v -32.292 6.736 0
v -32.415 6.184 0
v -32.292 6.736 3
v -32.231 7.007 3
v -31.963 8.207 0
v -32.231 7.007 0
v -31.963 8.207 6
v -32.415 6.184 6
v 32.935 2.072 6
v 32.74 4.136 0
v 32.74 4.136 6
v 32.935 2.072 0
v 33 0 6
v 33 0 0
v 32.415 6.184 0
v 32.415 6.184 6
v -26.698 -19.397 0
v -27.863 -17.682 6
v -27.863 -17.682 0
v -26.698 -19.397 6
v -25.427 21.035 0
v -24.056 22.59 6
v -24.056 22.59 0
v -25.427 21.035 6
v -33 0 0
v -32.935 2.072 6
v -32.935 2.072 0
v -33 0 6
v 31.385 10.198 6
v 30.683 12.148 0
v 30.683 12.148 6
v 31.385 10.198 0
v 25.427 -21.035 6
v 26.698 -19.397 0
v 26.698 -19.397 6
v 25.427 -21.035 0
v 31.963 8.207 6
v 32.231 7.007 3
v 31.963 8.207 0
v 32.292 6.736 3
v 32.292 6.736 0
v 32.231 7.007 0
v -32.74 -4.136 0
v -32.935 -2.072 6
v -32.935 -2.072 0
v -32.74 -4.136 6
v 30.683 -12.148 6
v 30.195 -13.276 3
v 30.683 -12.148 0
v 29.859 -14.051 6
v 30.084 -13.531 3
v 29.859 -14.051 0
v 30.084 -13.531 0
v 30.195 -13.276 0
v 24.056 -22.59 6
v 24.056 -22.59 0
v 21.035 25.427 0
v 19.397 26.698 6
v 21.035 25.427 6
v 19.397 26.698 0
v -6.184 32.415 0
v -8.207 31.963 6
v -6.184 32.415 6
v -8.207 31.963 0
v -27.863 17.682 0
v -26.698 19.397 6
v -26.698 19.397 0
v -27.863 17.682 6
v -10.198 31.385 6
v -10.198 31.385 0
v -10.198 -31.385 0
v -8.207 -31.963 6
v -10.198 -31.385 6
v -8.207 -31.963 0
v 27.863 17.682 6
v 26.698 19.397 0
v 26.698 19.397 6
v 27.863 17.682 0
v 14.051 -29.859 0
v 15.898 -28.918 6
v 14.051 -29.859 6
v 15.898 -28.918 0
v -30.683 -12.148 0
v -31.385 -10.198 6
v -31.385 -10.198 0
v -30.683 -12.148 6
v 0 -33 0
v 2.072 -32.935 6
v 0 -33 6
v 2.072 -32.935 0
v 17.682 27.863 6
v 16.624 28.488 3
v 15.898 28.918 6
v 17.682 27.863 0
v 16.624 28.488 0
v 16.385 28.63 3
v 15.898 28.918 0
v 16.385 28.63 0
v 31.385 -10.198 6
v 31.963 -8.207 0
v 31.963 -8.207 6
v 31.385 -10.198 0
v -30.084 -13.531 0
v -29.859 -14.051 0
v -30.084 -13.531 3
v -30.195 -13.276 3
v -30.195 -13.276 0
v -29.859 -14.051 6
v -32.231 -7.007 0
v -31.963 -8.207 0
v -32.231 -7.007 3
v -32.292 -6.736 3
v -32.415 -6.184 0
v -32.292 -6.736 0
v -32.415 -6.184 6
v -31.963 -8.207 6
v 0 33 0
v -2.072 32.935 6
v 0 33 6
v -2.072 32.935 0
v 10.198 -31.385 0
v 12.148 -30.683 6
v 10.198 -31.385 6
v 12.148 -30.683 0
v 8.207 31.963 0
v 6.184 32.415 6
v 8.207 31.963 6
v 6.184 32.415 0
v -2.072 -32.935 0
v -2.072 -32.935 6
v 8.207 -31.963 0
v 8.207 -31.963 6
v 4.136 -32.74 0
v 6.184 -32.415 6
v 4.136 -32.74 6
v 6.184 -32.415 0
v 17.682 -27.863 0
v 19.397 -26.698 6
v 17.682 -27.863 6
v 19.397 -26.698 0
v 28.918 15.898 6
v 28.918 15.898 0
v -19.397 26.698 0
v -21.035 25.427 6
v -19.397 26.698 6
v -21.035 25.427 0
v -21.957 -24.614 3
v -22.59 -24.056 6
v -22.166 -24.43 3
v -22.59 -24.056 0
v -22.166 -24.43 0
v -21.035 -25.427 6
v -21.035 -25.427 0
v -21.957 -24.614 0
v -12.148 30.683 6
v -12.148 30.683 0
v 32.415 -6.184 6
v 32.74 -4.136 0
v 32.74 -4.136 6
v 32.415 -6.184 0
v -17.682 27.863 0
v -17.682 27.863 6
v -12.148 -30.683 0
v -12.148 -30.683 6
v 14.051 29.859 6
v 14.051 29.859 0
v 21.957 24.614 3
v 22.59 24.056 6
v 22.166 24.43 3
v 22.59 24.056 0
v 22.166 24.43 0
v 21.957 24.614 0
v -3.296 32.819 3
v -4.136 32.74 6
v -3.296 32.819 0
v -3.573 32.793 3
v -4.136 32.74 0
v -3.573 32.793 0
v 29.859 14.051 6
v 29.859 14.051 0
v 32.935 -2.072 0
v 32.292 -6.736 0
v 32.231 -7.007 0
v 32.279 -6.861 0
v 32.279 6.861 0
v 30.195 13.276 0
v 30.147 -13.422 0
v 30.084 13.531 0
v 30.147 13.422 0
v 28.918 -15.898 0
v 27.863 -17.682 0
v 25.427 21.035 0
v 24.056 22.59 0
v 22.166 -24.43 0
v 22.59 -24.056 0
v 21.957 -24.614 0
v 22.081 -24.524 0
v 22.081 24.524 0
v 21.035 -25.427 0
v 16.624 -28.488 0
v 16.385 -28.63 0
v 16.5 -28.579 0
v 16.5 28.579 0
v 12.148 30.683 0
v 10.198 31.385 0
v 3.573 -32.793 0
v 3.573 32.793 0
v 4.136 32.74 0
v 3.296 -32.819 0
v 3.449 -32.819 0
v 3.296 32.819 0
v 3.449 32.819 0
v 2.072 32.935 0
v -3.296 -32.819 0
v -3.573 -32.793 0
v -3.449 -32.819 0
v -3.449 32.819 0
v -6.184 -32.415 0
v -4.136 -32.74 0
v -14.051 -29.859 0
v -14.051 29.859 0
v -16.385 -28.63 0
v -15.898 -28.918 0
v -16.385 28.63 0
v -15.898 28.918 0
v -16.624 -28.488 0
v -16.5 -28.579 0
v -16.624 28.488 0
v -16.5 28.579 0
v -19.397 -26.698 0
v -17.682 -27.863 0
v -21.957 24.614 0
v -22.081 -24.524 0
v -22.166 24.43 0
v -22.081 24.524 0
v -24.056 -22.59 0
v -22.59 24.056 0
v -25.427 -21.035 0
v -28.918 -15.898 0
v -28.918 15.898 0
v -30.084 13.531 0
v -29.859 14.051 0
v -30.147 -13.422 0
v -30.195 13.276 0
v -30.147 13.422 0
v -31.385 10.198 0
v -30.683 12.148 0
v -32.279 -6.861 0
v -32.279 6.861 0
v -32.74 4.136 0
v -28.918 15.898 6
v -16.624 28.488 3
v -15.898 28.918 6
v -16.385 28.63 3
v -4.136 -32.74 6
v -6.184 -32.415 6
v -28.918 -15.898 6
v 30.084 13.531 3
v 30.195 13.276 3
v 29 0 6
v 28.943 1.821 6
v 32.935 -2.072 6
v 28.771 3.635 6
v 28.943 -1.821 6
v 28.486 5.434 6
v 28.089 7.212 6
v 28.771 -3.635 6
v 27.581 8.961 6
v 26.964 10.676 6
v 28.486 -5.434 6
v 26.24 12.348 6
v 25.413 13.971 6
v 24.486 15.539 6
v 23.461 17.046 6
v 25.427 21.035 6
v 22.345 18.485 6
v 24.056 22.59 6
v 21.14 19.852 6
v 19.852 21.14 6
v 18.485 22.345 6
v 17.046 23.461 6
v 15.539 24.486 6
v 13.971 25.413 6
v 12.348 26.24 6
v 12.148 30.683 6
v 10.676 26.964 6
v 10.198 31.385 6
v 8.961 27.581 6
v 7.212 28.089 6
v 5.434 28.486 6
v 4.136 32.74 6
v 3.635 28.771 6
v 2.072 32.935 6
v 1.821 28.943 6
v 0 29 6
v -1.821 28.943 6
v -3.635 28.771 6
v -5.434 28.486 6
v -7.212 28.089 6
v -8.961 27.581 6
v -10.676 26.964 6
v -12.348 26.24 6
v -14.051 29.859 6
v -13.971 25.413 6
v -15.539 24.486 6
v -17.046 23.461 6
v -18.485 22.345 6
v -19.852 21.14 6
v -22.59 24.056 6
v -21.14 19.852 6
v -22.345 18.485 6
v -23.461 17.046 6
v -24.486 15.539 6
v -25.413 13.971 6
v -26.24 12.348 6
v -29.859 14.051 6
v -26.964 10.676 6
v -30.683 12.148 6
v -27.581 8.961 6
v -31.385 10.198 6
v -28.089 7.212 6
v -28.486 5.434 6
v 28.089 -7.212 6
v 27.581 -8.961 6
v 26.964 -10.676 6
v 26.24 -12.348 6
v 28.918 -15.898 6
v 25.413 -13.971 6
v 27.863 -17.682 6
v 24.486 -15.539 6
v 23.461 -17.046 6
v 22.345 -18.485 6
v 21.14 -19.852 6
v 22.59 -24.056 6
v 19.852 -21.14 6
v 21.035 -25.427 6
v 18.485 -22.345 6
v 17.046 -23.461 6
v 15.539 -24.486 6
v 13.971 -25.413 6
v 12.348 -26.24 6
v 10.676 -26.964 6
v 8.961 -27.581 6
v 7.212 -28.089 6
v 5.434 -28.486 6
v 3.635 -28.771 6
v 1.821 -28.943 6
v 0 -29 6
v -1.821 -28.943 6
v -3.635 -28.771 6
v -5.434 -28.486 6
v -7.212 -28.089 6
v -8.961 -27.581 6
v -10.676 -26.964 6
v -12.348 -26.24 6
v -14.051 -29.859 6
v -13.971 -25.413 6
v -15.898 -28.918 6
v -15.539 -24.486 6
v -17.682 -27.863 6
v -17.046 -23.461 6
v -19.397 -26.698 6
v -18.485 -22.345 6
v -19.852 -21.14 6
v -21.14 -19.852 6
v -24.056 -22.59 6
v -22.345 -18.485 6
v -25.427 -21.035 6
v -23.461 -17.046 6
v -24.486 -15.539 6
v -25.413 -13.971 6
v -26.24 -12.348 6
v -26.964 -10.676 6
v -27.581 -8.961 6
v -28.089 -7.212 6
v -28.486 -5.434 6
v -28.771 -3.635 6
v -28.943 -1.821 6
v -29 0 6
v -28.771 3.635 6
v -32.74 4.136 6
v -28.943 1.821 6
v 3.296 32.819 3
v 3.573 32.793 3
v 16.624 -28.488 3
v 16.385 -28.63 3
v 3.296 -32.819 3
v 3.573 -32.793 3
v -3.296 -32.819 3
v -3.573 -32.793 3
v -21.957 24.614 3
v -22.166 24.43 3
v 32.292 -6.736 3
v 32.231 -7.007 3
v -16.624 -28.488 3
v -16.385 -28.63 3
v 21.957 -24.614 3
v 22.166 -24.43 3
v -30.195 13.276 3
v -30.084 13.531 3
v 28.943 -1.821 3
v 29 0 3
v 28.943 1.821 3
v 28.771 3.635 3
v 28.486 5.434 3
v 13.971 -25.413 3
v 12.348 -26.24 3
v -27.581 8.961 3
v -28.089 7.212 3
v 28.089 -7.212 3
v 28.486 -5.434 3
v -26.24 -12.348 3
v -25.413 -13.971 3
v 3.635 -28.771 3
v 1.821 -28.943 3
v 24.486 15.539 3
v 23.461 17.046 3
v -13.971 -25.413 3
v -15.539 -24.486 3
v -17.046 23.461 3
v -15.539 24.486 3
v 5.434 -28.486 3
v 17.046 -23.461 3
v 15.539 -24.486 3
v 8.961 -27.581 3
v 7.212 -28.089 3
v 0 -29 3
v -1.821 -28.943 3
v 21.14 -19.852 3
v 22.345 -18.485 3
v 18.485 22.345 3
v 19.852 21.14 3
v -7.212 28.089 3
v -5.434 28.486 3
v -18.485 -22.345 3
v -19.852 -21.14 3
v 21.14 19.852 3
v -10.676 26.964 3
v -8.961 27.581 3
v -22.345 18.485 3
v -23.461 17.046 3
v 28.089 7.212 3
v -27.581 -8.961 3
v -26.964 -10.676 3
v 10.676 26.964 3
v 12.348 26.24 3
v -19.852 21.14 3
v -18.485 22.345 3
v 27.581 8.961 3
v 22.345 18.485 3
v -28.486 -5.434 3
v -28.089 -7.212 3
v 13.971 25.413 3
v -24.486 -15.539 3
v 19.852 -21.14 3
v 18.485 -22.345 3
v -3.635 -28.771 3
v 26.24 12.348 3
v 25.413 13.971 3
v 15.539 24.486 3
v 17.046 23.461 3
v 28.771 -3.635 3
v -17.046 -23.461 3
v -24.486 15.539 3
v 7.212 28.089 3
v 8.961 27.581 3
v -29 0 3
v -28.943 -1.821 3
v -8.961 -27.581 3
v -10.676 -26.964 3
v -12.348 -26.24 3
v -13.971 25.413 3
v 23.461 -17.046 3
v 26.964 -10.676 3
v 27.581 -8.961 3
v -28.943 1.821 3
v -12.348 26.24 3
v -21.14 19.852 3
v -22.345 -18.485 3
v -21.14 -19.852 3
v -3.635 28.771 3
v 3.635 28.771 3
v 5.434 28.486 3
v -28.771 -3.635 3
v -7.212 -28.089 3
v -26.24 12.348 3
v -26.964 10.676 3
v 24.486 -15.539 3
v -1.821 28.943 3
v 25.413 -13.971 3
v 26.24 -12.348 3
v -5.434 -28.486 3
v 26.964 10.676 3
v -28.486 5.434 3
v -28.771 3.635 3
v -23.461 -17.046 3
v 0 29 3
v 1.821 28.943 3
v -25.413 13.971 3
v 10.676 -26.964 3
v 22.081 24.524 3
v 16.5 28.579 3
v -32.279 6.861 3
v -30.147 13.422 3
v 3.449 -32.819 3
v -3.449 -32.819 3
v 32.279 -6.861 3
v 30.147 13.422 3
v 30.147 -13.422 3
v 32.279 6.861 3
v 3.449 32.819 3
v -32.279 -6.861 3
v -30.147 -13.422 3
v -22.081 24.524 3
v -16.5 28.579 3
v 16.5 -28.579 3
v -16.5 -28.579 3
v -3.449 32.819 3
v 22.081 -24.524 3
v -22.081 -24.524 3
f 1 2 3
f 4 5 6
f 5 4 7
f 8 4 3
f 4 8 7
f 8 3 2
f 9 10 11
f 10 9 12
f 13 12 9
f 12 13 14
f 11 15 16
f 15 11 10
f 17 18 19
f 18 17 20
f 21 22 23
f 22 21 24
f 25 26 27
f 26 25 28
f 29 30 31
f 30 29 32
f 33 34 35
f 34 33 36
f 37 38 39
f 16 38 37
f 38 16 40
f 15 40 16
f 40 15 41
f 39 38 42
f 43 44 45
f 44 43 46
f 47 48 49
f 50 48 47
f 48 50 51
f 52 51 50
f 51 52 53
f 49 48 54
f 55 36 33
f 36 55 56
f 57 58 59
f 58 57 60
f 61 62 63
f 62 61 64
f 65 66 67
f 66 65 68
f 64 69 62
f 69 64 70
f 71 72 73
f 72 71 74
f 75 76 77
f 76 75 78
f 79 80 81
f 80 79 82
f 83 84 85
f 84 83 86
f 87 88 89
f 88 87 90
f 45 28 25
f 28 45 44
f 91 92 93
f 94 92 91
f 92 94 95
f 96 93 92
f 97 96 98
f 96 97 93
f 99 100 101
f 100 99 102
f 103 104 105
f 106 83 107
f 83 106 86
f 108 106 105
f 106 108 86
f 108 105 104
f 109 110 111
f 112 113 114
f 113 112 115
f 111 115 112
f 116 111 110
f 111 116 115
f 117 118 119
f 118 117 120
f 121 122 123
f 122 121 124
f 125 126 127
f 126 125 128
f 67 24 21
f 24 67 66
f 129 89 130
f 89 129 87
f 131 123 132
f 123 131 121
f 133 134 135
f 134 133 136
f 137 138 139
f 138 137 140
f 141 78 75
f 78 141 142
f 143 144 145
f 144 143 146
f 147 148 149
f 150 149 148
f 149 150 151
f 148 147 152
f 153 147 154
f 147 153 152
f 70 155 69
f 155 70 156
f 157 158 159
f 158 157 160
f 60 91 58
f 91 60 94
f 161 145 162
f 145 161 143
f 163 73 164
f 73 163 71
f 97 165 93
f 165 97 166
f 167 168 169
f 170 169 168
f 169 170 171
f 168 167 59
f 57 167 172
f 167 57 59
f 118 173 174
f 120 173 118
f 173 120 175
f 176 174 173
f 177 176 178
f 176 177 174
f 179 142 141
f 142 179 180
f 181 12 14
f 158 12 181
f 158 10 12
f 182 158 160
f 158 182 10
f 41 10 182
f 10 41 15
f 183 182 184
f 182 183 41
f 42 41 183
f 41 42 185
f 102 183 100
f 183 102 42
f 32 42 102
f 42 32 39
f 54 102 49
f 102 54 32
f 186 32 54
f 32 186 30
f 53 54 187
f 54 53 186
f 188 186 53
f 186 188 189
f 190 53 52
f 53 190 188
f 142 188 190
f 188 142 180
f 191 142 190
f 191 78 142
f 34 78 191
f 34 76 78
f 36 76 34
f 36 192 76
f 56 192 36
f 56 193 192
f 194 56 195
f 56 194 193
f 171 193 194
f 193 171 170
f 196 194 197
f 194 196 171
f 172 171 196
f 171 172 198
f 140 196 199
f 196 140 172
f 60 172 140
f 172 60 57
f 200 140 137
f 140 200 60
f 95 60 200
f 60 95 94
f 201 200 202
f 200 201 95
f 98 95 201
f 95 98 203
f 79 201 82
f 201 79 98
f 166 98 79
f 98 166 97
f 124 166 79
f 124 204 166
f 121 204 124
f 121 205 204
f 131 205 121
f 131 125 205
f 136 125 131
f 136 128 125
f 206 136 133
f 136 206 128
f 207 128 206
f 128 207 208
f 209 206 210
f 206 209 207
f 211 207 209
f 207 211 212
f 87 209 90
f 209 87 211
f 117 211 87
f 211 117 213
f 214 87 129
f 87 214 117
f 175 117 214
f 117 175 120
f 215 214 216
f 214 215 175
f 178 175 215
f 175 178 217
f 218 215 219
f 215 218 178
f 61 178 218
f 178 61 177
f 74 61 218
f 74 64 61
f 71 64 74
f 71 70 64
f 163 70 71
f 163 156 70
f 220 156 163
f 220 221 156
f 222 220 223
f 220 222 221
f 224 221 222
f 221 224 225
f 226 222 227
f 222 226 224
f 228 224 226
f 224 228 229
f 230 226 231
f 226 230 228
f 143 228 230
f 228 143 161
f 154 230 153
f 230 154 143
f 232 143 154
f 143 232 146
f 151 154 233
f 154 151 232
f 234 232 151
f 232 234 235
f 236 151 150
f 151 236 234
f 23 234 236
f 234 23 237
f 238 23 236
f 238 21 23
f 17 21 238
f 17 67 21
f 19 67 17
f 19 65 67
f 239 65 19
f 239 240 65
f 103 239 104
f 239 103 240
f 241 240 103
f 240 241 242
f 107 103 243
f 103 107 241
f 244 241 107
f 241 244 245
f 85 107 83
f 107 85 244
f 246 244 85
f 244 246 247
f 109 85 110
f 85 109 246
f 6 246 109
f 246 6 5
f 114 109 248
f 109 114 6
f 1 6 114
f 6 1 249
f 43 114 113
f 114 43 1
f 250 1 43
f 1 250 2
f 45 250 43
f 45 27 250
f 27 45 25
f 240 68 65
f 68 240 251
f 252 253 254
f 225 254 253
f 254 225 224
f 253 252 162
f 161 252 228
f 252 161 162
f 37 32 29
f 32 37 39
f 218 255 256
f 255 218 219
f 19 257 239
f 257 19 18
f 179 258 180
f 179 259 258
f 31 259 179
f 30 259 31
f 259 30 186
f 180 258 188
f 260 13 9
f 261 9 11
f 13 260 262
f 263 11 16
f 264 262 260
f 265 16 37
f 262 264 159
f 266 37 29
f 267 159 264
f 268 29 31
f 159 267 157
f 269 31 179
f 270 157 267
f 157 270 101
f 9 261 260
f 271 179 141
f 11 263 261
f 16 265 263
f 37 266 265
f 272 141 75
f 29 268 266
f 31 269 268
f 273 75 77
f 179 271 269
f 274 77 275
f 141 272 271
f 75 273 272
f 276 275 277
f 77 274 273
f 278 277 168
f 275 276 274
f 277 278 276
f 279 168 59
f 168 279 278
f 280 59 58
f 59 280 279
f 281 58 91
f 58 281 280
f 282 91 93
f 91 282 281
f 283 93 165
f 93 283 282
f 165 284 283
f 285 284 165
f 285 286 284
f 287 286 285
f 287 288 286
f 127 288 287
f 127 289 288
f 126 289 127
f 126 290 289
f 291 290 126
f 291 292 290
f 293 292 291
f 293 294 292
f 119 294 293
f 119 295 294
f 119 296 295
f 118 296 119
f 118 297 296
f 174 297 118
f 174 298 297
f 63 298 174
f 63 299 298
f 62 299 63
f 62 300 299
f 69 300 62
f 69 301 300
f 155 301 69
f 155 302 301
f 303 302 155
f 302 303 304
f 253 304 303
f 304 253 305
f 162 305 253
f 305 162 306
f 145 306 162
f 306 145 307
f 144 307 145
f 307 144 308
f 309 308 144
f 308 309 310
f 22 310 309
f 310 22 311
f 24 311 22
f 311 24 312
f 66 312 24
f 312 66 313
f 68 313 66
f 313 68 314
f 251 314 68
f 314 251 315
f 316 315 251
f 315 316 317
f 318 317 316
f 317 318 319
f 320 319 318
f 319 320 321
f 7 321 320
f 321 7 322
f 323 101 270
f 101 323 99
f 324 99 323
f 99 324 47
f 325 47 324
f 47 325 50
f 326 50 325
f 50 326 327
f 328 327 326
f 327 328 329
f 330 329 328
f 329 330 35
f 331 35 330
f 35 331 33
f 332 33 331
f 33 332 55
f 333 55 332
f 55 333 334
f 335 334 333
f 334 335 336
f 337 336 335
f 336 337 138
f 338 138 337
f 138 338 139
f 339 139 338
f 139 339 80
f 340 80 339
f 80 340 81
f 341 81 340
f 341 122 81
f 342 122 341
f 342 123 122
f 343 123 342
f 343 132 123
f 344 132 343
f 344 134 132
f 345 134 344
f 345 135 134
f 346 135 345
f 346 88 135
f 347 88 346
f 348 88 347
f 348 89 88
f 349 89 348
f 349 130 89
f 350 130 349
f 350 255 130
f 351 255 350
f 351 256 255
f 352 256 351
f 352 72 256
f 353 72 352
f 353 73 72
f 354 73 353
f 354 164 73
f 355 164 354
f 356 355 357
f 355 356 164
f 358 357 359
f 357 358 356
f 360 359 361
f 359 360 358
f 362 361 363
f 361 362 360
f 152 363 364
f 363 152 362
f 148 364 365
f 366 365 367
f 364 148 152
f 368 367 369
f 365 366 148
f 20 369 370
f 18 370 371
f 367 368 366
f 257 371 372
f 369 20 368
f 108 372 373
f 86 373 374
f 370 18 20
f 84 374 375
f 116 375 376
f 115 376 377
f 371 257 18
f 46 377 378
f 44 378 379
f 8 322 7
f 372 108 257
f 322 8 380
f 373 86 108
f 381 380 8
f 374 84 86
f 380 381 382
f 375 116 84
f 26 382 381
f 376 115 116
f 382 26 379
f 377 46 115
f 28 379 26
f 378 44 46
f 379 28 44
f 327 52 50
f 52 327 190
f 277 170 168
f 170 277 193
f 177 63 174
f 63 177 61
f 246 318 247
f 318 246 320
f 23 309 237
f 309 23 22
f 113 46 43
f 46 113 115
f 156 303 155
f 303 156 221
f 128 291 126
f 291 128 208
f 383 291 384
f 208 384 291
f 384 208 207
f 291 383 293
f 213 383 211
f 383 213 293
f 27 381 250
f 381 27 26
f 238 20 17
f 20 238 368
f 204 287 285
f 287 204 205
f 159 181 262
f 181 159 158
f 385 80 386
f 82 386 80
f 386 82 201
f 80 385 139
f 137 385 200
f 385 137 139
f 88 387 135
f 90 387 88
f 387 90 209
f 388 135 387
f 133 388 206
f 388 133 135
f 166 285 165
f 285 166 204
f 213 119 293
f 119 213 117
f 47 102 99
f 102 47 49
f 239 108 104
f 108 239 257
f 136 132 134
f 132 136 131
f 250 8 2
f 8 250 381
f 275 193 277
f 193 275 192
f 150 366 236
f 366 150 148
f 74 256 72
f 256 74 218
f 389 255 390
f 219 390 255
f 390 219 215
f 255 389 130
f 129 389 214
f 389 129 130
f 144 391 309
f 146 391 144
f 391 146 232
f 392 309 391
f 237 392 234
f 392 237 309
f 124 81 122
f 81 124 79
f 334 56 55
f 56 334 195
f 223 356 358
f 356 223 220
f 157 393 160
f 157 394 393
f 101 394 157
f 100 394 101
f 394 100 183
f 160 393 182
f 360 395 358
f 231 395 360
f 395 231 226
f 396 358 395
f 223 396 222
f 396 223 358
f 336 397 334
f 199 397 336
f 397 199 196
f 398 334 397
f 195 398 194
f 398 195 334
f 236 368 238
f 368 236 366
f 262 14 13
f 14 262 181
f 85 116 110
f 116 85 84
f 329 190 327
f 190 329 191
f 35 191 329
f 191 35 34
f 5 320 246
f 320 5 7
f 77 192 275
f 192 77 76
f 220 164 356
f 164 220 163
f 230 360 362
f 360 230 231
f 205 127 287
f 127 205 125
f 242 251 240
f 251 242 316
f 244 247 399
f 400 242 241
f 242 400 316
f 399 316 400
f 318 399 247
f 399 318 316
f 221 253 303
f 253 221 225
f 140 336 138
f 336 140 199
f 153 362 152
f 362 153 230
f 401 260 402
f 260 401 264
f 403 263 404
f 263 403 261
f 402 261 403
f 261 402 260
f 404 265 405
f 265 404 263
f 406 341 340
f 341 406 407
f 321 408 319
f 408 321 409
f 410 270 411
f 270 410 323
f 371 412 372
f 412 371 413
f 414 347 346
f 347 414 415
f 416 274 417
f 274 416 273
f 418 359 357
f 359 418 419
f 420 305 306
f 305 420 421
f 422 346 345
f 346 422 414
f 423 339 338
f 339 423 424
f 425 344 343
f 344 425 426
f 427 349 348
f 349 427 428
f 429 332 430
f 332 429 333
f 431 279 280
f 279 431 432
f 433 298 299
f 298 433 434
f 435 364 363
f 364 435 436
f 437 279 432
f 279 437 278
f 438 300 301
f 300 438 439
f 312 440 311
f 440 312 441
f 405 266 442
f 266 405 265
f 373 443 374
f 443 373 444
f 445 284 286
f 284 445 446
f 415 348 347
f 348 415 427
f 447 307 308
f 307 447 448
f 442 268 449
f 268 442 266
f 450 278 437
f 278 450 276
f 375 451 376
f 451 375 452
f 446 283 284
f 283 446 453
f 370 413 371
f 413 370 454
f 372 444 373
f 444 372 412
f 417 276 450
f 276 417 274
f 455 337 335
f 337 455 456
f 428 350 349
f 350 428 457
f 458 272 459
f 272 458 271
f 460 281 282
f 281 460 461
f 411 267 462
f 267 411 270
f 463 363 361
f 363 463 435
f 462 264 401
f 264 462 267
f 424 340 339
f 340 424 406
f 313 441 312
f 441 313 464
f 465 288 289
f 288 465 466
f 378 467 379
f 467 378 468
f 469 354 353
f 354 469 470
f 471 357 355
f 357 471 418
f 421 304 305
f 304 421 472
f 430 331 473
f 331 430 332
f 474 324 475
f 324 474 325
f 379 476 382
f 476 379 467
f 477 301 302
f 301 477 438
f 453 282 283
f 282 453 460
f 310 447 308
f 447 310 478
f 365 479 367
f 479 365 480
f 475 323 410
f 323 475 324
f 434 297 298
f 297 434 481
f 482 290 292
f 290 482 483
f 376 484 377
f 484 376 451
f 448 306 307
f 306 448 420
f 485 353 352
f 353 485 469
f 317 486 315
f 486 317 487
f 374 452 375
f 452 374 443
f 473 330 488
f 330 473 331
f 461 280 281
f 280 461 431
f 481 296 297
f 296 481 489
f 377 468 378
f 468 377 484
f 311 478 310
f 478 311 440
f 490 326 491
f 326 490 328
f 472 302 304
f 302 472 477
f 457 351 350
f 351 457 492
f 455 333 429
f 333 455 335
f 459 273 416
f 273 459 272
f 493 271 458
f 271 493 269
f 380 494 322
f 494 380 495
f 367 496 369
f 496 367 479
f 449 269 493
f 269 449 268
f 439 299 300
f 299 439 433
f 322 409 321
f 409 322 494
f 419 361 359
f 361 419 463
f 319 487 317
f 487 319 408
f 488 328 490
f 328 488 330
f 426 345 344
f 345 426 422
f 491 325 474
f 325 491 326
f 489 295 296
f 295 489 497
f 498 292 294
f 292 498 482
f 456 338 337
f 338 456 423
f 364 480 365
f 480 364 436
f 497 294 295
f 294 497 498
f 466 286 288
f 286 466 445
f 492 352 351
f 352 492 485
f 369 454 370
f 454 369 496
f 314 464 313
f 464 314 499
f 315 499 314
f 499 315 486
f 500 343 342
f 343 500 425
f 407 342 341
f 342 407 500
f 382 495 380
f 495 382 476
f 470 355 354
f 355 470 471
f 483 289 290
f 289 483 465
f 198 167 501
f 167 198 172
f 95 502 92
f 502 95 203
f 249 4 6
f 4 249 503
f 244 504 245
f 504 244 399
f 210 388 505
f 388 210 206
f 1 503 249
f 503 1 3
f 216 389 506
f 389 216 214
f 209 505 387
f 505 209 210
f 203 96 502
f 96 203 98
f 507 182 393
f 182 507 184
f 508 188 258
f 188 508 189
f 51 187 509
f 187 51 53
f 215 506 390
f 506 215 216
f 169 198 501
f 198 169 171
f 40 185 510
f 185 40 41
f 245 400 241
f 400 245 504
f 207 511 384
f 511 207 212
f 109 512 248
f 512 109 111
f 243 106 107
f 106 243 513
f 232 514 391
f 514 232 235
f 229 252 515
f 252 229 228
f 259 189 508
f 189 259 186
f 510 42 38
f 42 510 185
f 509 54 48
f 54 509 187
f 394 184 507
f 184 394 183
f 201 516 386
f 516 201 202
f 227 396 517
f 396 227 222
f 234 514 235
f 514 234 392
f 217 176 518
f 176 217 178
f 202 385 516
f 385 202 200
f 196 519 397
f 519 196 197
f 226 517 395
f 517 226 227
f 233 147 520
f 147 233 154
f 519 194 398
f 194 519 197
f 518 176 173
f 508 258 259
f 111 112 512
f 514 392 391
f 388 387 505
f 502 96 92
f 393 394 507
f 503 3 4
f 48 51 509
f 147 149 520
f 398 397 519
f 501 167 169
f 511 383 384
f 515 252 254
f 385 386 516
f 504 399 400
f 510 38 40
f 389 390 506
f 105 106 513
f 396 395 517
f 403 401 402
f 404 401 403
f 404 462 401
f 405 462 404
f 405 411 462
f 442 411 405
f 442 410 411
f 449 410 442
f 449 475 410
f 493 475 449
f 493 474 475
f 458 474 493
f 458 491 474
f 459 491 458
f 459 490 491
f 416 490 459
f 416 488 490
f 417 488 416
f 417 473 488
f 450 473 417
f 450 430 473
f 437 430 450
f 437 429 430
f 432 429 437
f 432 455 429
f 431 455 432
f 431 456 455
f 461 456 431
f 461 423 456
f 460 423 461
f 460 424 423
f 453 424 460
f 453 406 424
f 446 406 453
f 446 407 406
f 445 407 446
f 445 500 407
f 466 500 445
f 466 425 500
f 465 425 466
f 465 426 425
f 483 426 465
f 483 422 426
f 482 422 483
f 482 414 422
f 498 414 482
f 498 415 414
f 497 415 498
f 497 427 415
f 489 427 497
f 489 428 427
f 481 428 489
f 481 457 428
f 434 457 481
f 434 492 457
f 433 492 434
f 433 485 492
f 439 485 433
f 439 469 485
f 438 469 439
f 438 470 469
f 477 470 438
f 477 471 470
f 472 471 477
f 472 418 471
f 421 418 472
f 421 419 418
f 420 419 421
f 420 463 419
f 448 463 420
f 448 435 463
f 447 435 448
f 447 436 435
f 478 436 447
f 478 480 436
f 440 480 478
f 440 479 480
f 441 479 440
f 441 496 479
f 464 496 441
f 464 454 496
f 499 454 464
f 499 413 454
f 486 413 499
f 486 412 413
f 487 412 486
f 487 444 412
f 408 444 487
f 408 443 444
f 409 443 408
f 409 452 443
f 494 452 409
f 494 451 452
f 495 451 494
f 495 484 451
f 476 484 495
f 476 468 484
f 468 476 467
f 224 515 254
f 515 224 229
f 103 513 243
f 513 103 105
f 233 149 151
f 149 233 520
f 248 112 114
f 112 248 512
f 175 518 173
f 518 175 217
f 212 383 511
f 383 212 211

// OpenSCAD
// file: ../../../shapes/open-cylinder/open-cylinder.scad
// TODO: Lower this to 50.
module openCylinder(height = 3,
                    outerRadius = 7,
                    innerRadius = 4.5,
                    fn = 100)
{
    $fn = fn;

    difference()
    {
        cylinder(r=outerRadius,
                 h=height);

        translate([0, 0, -1])
        cylinder(r=innerRadius,
                 h=height+1.01);
    }
}
// file: ../endcap.scad
use <../../shapes/open-cylinder/open-cylinder.scad>

module endcap(height = 10,
				innerRadius = 20,
				outerRadius = 24,
				endThickness = 3)
{
	union()
	{
		openCylinder(innerRadius = innerRadius,
						height = height, 
						outerRadius = outerRadius);

		endcap_end(height = endThickness,
					outerRadius = outerRadius);
	}
}

// support moduiles follow

module endcap_end(height, outerRadius)
{
	cylinder(h = height,
				r = outerRadius);
}
// main file
use <../endcap.scad>

height = 6;
innerRadius = 29;
outerRadius = 33;
endThickness = 3;

endcap(height = height,
				innerRadius = innerRadius,
				outerRadius = outerRadius,
				endThickness = endThickness);
